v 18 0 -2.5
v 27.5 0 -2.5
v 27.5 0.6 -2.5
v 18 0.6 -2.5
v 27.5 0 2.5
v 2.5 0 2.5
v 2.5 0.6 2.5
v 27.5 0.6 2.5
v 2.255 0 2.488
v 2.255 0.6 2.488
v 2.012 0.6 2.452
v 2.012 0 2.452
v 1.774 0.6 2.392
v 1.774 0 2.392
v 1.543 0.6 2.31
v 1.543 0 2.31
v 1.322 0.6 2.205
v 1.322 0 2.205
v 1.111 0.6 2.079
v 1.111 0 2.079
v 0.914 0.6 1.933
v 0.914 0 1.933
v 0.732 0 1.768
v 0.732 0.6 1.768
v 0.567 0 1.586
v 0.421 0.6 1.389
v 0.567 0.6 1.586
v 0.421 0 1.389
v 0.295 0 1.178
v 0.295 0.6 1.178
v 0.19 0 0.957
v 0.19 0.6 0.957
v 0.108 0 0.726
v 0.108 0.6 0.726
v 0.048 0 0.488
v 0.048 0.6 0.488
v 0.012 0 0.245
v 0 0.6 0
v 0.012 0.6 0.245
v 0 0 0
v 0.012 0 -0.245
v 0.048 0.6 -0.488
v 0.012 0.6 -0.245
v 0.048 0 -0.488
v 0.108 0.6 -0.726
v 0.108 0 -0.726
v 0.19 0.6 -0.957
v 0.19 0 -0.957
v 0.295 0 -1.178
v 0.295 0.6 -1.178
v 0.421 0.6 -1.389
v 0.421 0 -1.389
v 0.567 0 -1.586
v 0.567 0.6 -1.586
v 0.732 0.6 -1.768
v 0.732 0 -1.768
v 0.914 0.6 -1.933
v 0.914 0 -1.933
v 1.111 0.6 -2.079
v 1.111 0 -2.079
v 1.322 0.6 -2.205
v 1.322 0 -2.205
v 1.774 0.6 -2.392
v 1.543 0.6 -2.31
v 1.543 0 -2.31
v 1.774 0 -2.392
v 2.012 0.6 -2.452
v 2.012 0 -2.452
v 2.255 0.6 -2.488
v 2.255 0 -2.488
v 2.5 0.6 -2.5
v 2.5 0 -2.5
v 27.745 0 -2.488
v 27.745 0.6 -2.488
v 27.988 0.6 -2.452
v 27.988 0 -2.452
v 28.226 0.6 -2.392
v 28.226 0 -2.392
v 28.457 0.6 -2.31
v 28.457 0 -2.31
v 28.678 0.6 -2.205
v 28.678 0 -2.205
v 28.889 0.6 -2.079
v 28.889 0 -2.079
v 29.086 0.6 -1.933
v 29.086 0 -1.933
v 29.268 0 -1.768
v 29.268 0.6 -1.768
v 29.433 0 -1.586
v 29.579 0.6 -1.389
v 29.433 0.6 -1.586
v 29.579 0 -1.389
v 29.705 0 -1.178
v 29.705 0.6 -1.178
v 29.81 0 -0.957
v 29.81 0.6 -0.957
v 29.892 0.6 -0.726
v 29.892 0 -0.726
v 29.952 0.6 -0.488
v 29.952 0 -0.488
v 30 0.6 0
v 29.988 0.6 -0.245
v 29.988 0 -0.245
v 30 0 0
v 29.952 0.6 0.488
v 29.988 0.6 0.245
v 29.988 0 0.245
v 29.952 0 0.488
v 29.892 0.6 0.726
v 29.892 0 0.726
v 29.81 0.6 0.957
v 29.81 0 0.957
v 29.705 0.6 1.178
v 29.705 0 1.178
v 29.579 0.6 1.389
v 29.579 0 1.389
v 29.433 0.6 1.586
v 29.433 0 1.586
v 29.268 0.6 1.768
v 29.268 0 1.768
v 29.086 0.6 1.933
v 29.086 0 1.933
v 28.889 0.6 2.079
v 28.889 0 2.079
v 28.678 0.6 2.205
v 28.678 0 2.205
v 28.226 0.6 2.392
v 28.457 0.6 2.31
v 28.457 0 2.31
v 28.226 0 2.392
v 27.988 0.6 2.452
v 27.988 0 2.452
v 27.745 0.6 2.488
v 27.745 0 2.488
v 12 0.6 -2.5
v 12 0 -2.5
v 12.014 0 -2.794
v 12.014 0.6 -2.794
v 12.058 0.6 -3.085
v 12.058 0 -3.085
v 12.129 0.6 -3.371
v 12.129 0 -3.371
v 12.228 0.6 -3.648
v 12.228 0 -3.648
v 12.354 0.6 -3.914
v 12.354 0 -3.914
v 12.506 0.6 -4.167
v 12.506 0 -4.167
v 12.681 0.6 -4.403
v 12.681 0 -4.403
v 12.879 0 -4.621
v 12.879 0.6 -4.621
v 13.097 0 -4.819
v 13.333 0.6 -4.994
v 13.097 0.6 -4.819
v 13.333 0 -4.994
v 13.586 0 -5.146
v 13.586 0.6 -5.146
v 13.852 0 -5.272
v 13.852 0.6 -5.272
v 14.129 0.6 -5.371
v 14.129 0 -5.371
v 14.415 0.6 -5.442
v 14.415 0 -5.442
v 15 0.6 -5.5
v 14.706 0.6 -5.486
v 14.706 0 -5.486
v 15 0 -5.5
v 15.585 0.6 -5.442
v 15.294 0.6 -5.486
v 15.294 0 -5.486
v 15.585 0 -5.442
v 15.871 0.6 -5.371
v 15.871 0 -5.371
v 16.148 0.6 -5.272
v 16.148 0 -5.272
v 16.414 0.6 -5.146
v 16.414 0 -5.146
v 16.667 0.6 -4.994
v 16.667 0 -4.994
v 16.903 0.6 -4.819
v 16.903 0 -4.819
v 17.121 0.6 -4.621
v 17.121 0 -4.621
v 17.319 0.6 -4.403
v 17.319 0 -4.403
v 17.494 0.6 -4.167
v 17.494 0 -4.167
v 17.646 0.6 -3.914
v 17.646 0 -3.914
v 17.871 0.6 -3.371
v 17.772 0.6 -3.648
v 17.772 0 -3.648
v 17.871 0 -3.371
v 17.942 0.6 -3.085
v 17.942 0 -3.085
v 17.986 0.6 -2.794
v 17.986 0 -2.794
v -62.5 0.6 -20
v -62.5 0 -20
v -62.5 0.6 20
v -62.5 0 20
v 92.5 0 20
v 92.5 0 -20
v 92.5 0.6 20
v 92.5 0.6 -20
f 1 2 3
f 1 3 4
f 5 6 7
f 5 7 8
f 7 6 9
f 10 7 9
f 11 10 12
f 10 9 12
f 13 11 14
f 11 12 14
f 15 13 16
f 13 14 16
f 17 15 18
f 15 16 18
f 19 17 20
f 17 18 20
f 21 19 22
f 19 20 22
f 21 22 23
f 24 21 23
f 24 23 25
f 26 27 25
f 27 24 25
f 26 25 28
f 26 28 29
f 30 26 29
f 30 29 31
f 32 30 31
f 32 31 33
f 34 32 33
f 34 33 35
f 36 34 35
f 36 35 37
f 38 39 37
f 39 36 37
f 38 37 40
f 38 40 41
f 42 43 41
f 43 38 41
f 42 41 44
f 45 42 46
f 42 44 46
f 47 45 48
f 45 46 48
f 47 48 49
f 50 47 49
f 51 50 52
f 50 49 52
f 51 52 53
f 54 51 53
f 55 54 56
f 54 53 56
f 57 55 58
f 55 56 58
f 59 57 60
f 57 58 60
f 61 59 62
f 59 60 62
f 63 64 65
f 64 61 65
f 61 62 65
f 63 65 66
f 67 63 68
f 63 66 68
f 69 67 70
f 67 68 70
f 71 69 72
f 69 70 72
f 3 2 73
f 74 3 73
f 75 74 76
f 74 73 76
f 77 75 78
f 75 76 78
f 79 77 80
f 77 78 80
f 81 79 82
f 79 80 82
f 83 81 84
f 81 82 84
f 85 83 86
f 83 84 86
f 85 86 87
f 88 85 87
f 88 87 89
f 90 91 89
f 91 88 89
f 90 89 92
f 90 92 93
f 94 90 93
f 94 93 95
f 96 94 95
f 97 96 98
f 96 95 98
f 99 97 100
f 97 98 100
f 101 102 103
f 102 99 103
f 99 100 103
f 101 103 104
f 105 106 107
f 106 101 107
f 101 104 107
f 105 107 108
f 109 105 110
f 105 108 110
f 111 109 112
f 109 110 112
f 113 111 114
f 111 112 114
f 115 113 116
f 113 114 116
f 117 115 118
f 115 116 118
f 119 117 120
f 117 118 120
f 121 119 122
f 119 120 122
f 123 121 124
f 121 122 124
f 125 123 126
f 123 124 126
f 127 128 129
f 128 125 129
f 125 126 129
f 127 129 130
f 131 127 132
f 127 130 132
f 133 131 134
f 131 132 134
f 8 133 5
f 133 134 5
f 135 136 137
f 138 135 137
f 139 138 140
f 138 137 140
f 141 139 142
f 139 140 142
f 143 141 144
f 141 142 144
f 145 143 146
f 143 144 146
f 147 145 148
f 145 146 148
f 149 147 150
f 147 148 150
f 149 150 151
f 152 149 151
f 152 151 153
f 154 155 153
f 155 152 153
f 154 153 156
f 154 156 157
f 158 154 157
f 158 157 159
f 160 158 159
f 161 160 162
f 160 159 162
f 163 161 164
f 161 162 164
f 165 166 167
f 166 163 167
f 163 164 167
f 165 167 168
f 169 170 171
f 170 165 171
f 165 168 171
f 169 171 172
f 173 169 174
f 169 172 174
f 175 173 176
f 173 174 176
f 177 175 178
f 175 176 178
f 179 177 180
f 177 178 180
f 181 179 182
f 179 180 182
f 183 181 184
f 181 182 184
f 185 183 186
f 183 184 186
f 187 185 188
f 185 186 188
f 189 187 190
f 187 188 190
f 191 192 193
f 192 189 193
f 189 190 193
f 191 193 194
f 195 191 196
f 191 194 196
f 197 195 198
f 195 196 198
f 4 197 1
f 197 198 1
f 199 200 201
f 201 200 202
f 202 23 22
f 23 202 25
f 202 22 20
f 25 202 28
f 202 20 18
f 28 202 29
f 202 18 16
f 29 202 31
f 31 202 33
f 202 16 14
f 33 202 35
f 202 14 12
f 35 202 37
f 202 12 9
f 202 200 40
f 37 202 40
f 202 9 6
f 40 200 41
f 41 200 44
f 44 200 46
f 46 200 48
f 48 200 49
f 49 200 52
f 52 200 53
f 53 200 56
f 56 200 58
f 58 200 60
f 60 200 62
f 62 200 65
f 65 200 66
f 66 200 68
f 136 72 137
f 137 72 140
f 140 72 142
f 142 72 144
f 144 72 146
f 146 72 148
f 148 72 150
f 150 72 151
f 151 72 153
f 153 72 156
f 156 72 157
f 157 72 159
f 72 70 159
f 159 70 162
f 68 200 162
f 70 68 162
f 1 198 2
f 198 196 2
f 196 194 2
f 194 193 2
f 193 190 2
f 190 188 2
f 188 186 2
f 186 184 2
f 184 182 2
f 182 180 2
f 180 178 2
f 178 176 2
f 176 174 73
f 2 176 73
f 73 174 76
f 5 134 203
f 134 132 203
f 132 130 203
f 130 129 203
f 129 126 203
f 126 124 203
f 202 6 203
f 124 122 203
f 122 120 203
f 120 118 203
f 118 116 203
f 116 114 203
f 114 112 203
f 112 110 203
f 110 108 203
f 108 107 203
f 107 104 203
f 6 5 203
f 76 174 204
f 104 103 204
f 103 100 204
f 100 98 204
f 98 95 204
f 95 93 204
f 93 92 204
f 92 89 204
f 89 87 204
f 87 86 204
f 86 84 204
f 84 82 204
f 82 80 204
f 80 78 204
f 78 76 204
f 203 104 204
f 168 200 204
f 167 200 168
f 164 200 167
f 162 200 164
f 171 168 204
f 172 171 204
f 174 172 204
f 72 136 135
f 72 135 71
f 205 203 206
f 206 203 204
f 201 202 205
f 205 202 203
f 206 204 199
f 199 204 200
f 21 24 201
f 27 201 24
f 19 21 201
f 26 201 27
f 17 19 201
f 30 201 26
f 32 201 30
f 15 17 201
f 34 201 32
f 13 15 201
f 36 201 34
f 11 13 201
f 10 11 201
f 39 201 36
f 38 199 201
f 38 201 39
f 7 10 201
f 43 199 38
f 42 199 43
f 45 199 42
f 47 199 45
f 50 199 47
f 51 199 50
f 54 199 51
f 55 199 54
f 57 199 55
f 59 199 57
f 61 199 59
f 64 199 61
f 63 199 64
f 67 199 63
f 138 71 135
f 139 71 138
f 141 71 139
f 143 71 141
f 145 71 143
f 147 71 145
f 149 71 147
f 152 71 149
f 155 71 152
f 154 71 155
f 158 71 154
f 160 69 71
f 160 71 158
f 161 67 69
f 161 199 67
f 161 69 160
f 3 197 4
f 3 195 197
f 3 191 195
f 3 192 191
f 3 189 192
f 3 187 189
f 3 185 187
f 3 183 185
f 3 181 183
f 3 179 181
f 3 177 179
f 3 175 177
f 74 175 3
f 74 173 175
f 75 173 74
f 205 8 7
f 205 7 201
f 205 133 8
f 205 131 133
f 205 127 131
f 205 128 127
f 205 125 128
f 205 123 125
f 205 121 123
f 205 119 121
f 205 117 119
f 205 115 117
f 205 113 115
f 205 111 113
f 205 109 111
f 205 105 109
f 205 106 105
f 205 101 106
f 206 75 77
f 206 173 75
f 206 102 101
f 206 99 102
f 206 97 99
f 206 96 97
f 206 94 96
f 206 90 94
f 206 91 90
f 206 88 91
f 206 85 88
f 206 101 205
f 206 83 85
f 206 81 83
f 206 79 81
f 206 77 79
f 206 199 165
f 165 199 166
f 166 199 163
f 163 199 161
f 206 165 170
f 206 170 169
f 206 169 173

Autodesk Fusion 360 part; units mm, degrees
sketch "Sketch1" plane through (0, 0, 0) normal (0, 1, 0) x (1, 0, 0)
  line L0 (2.5, -2.5) -> (27.5, -2.5)
  arc A0 (27.5, -2.5) -> (27.5, 2.5) centre (27.5, 0) ccw
  arc A1 (2.5, 2.5) -> (2.5, -2.5) centre (2.5, 0) ccw
  line L1 (0, 0) -> (30, 0) construction
  line L2 (15, 2.5) -> (15, 10) construction
  line L3 (15, 2.5) -> (15, -7) construction
  arc A2 (18, 2.5) -> (12, 2.5) centre (15, 2.5) ccw
  line L4 (27.5, 2.5) -> (18, 2.5)
  line L5 (12, 2.5) -> (2.5, 2.5)
  point P0 (15, 0)
  dimension "d2" = 6
  dimension "d3" = 30
  dimension "d5" = 5
sketch "Sketch2" plane through (0, 0, 0) normal (0, 1, 0) x (1, 0, 0)
  line L0 (30, 10) -> (30, -30)
  line L1 (92.5, 20) -> (-62.5, 20)
  line L2 (-62.5, 20) -> (-62.5, -20)
  line L3 (-62.5, -20) -> (92.5, -20)
  line L4 (92.5, -20) -> (92.5, 20)
  line L5 (92.5, 20) -> (-62.5, -20) construction
  line L6 (-62.5, 20) -> (92.5, -20) construction
  point P0 (15, 0)
  point P1 (15, 0)
  dimension "d7" = 40
  dimension "d10" = 40
  dimension "d11" = 155
extrude "Extrude1" add sketch "Sketch2" sketch "Sketch1" along normal blind 0.6 of sketch 2
extrude "Extrude2" cut sketch "Sketch1" along normal up to surface (0.6 mm away)
sketch "Sketch3" plane through (0, 0.6, 0) normal (0, 1, 0) x (-1, 0, 0)
  line L0 (-27.5, 2.5) -> (-2.5, 2.5)
  arc A0 (-2.5, -2.5) -> (-2.5, 2.5) centre (-2.5, 0) ccw
  line L1 (-2.5, -2.5) -> (-12, -2.5)
  arc A1 (-18, -2.5) -> (-12, -2.5) centre (-15, -2.5) ccw
  line L2 (-18, -2.5) -> (-27.5, -2.5)
  arc A2 (-27.5, 2.5) -> (-27.5, -2.5) centre (-27.5, 0) ccw
  line L3 (-92.5, 20) -> (-92.5, -20)
  line L4 (-92.5, -20) -> (62.5, -20)
  line L5 (62.5, -20) -> (62.5, 20)
  line L6 (62.5, 20) -> (-92.5, 20)
  line L7 (-2.5, 2.5) -> (-27.5, 2.5)
  arc A3 (-27.5, 2.5) -> (-27.5, -2.5) centre (-27.5, 0) ccw
  line L8 (-27.5, -2.5) -> (-18, -2.5)
  arc A4 (-18, -2.5) -> (-12, -2.5) centre (-15, -2.5) ccw
  line L9 (-12, -2.5) -> (-2.5, -2.5)
  arc A5 (-2.5, -2.5) -> (-2.5, 2.5) centre (-2.5, 0) ccw
  line L10 (-92.5, -20) -> (-92.5, 20)
  line L11 (-92.5, 20) -> (62.5, 20)
  line L12 (62.5, 20) -> (62.5, -20)
  line L13 (62.5, -20) -> (-92.5, -20)
  line L14 (-15, -5.5) -> (-102, -5.5) construction
  line L15 (-15, -5.5) -> (63, -5.5) construction
  dimension "d17" = 8
equation "d7 = höhe"
equation "breite = 155 mm"
equation "höhe = 40 mm"
equation "d10 = höhe"
equation "d11 = breite"
equation "dicke = 0.6 mm"
equation "d13 = dicke"
